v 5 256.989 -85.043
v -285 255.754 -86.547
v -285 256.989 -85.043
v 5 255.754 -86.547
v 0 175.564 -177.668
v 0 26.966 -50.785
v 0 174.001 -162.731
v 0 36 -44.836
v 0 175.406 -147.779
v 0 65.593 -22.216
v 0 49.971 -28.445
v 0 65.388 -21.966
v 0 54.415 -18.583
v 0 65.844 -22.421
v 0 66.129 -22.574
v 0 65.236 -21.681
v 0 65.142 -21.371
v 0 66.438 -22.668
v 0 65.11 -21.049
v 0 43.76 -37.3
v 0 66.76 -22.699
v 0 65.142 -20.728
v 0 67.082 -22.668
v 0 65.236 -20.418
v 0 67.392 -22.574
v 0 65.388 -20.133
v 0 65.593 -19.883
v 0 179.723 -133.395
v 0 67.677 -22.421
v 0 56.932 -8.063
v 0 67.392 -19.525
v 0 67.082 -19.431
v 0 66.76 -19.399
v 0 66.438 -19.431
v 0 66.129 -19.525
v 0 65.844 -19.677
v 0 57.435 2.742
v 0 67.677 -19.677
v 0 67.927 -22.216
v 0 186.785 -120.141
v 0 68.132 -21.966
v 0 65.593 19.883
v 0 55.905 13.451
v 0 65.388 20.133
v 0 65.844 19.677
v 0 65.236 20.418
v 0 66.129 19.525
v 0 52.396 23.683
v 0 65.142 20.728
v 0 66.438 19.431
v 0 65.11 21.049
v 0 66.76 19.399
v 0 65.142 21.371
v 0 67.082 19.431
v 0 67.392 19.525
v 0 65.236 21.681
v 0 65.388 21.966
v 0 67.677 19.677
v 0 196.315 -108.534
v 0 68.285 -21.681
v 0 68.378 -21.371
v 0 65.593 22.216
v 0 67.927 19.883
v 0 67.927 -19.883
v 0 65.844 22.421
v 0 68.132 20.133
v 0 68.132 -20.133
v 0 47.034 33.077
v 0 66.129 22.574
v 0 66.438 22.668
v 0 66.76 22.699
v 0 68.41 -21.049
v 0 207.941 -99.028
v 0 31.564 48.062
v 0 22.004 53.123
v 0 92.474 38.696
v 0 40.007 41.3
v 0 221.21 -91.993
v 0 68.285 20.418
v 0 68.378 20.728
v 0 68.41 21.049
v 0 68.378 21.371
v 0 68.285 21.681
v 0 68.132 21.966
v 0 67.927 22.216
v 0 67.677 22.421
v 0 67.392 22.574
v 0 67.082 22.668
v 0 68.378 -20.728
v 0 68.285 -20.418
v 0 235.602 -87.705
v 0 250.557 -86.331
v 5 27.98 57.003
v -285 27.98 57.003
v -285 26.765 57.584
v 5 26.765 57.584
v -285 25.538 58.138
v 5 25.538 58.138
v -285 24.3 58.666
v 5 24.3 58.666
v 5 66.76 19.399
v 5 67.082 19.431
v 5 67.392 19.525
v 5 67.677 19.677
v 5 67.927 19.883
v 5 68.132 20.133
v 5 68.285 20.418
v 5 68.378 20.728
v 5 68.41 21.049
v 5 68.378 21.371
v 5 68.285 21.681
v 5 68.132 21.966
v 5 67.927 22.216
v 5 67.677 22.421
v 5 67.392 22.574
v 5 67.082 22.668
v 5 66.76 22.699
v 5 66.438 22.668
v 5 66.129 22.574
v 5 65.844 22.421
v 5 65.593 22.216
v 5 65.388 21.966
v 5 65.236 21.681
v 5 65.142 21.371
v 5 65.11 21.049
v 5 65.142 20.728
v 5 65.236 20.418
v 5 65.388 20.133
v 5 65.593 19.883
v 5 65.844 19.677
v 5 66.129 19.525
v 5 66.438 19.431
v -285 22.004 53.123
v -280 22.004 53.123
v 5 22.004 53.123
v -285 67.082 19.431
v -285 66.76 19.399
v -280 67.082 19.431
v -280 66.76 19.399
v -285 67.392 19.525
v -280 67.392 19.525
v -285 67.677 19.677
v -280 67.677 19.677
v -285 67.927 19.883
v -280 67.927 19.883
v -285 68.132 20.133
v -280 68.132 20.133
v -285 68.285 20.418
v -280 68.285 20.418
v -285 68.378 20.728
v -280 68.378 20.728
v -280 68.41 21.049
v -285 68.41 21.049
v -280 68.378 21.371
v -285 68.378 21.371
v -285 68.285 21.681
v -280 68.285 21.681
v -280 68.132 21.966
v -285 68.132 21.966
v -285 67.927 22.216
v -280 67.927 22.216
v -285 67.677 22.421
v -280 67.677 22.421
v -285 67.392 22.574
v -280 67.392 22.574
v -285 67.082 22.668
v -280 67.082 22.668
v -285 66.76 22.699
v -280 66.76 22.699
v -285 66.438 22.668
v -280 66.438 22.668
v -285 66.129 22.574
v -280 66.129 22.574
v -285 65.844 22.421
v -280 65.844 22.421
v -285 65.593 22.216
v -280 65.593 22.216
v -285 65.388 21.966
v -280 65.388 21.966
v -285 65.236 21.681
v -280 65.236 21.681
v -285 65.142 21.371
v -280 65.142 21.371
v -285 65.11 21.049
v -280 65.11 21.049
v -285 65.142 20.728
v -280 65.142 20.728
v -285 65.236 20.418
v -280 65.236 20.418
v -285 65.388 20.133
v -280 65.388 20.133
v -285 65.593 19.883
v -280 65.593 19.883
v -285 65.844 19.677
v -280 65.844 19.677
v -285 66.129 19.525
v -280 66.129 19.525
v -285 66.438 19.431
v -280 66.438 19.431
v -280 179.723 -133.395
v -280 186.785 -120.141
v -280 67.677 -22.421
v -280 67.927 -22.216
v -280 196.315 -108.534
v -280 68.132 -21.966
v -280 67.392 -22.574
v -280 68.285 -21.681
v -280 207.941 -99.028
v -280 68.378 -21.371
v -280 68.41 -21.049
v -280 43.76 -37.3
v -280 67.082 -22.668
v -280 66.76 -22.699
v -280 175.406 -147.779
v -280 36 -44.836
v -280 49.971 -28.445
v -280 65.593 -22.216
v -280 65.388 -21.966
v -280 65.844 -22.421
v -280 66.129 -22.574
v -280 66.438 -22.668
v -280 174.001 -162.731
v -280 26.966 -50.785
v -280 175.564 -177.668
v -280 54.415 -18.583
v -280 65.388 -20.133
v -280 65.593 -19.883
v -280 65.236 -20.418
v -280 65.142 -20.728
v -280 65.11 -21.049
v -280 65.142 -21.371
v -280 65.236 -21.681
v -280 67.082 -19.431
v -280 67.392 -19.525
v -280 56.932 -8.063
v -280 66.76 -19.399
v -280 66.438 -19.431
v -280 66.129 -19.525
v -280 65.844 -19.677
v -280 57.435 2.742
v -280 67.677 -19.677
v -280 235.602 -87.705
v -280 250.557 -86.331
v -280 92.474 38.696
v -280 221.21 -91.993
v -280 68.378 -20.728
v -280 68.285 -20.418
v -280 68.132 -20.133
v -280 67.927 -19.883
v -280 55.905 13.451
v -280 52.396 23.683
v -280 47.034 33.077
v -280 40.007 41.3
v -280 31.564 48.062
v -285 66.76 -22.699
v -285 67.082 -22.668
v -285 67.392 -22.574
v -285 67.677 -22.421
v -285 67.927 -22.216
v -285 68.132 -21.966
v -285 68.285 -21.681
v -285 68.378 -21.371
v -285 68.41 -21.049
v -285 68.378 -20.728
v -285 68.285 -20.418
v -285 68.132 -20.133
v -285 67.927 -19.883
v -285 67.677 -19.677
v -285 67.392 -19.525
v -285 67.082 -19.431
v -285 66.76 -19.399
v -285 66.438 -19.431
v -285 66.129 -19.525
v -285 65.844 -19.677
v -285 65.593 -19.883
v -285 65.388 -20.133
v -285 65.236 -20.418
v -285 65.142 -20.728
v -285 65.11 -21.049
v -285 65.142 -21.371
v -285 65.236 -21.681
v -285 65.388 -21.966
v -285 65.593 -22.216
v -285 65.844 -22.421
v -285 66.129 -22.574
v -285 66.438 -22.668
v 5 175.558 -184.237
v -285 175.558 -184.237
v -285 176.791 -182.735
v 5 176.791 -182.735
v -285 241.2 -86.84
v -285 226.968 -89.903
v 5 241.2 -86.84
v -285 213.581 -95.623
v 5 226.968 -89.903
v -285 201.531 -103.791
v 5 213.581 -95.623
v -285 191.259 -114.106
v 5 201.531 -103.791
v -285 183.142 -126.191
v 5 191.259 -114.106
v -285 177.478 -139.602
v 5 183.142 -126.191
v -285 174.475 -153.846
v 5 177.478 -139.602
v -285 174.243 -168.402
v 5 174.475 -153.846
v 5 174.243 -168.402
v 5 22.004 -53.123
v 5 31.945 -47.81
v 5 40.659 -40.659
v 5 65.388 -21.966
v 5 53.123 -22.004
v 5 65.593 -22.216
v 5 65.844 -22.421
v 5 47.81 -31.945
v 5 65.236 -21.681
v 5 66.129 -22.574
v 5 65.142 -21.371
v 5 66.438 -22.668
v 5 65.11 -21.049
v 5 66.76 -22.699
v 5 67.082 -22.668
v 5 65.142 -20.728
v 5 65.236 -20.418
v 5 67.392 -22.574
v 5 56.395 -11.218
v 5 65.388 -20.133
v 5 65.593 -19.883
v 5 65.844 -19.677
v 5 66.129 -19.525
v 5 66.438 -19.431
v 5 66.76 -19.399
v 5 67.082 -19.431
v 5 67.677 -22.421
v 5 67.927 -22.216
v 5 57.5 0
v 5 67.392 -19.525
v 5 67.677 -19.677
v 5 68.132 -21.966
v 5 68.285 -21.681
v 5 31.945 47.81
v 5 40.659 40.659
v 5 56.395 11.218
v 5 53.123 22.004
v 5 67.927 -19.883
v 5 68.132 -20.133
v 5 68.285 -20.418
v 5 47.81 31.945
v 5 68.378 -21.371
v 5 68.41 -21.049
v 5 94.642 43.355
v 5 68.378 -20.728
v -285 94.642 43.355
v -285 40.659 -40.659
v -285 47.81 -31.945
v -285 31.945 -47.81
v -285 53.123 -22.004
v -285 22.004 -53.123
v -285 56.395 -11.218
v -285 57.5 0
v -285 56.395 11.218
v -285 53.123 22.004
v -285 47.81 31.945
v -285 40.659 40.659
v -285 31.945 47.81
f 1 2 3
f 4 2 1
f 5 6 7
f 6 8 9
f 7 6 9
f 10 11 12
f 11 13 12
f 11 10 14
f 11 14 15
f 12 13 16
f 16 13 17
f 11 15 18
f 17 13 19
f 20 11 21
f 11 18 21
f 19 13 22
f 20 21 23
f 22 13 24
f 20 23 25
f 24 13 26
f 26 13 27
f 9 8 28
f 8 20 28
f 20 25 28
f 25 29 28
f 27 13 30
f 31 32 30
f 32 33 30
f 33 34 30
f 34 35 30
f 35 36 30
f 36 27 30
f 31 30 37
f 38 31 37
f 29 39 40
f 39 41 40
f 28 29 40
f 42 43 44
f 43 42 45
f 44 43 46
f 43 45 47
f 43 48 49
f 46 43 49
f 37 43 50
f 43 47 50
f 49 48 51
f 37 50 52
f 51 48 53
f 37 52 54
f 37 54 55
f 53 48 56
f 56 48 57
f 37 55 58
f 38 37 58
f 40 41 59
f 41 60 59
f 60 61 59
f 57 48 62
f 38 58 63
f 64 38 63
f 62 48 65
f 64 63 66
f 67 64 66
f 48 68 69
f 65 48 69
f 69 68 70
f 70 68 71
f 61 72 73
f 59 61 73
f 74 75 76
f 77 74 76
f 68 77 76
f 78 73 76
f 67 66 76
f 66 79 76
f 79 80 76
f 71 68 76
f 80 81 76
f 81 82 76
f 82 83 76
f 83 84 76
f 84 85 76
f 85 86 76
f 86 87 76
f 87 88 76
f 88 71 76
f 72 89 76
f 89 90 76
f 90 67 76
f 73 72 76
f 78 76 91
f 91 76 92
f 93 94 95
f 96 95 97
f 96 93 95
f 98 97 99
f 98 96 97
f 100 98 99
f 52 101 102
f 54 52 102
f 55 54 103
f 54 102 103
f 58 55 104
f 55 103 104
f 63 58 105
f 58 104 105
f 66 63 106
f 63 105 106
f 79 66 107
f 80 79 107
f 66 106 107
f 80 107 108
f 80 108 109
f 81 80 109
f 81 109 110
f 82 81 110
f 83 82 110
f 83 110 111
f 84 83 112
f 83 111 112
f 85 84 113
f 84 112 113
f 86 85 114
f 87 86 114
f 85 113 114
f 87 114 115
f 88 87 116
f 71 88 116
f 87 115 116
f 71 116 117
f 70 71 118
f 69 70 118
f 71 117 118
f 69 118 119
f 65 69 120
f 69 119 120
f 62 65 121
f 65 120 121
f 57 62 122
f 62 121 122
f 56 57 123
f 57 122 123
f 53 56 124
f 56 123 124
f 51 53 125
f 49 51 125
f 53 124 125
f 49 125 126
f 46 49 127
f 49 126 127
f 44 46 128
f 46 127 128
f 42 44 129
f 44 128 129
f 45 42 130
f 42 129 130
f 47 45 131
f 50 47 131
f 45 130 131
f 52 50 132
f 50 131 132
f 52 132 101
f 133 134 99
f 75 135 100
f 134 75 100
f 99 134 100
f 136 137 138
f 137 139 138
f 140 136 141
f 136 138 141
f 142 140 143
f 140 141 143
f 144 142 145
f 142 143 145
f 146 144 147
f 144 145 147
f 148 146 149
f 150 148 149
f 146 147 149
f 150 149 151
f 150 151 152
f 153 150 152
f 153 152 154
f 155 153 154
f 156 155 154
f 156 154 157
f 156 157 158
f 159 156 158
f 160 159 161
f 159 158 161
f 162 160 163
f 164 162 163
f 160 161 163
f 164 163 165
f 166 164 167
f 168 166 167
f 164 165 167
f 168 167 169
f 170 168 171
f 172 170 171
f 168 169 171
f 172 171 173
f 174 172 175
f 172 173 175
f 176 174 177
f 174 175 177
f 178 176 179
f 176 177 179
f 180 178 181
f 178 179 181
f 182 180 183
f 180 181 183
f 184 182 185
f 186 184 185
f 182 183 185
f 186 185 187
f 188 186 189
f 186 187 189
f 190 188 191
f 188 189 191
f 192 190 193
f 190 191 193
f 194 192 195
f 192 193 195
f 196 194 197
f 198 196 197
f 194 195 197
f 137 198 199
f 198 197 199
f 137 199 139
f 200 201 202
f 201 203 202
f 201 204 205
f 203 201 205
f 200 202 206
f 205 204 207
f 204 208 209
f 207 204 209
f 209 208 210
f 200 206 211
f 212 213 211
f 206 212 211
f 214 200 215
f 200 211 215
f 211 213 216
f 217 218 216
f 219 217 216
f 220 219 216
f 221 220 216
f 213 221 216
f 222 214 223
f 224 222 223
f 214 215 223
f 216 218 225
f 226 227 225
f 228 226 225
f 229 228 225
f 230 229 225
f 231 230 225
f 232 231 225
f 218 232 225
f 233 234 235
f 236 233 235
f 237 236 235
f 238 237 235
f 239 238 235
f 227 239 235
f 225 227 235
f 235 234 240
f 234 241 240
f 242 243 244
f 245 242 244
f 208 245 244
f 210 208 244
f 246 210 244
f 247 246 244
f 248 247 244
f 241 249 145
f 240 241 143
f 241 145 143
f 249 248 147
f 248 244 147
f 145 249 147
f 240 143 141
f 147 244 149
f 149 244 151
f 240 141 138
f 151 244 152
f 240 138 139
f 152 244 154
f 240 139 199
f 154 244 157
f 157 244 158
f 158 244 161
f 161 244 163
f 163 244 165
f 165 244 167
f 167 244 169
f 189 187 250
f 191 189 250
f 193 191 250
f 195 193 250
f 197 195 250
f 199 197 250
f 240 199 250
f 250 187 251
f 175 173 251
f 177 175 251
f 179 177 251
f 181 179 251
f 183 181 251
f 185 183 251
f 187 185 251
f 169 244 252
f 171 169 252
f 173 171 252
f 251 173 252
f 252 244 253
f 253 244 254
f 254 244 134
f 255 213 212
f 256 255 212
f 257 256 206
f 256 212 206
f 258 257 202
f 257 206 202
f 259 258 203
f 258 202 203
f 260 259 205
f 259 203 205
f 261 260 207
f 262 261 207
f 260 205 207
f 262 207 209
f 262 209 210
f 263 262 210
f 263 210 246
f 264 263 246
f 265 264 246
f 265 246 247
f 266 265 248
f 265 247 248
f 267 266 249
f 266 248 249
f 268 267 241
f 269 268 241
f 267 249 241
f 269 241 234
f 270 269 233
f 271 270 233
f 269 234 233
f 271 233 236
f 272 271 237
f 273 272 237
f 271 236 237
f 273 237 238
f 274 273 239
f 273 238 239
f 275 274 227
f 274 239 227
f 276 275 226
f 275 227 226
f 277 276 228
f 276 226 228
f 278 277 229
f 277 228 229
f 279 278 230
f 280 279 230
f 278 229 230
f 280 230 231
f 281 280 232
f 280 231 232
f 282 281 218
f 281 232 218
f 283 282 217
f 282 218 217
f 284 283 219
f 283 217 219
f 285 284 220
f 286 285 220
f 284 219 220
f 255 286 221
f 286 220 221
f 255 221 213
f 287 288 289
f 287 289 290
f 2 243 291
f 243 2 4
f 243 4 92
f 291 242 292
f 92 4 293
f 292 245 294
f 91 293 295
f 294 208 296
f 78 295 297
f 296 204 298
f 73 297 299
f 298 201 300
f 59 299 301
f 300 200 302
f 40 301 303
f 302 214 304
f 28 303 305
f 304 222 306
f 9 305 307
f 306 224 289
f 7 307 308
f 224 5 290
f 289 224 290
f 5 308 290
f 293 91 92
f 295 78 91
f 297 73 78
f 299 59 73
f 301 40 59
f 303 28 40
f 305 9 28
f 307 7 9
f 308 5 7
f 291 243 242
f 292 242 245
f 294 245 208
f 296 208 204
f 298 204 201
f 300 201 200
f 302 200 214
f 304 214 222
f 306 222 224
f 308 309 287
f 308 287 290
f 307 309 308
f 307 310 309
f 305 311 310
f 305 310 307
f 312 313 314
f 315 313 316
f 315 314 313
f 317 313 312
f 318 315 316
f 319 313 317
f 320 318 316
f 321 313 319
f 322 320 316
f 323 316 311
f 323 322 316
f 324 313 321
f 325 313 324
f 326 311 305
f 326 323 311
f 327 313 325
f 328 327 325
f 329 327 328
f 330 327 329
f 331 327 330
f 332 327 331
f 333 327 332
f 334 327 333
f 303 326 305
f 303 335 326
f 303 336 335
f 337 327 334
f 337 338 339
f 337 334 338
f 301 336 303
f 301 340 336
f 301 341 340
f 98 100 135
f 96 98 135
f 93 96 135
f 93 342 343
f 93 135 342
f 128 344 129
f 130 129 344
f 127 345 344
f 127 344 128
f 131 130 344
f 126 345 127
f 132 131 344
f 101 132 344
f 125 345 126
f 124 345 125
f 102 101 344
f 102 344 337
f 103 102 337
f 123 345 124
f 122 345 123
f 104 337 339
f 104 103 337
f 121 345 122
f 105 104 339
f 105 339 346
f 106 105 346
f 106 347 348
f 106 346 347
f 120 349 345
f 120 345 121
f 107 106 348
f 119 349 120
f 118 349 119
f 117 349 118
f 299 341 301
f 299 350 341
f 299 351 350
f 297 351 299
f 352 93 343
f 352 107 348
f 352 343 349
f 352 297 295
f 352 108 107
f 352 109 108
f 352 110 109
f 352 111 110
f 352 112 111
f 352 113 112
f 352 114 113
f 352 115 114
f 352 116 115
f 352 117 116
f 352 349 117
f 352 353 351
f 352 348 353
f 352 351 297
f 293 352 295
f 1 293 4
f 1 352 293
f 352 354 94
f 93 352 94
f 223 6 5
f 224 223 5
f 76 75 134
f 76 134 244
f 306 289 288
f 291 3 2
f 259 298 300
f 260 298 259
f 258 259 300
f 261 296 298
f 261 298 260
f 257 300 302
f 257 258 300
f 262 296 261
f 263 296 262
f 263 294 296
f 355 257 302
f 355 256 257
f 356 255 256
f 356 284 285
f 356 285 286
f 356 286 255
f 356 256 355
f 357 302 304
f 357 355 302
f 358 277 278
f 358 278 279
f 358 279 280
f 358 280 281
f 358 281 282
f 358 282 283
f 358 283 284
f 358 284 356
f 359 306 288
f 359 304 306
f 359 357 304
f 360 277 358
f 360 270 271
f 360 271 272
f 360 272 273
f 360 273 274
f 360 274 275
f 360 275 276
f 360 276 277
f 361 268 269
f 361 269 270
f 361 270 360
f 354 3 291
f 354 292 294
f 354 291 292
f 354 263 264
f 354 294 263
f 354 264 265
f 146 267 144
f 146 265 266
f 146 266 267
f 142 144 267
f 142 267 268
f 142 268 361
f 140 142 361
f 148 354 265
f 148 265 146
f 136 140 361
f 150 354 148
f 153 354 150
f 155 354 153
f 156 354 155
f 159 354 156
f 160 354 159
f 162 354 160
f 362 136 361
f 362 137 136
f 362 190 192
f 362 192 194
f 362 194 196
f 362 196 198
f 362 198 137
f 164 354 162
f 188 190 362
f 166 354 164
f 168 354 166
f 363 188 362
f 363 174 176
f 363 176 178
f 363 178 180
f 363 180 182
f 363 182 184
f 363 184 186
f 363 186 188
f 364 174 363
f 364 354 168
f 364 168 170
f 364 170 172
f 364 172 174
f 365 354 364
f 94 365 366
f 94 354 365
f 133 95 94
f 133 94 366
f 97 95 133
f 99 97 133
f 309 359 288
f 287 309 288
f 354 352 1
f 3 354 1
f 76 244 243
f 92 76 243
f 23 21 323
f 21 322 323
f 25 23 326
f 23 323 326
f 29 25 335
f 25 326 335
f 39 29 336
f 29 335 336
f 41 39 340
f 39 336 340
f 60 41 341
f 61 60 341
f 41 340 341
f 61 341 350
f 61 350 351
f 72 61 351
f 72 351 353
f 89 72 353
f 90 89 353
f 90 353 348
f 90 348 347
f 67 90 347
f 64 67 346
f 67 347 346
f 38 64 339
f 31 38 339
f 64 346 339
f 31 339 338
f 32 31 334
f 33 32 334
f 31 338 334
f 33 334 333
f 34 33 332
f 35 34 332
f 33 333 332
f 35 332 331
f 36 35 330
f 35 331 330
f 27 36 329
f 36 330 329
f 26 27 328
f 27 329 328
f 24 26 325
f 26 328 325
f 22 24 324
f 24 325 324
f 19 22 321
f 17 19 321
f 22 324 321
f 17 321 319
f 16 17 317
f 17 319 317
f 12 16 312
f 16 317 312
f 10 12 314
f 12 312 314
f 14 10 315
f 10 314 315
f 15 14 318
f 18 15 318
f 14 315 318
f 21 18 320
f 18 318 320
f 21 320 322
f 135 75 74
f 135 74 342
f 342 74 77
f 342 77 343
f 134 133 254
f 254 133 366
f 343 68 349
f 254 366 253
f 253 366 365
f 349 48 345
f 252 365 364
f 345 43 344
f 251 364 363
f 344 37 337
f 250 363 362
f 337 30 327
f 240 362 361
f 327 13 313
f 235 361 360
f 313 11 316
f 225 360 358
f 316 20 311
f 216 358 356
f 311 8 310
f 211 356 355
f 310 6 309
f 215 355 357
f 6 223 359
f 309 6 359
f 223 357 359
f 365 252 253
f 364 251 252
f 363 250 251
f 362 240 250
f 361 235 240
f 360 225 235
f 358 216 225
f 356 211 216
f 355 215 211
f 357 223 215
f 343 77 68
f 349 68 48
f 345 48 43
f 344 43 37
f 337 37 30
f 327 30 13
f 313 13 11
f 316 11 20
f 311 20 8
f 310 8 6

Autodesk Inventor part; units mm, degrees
ref_plane "YZ Plane" through (0, 0, 0) normal (1, 0, 0) x (0, 1, 0)
ref_plane "XZ Plane" through (0, 0, 0) normal (0, 1, 0) x (-1, 0, 0)
ref_plane "XY Plane" through (0, 0, 0) normal (0, 0, 1) x (1, 0, 0)
sketch "Sketch1" plane through (0, 0, 0) normal (1, 0, 0) x (0, 1, 0)
  circle A0 centre (0, 0) radius 57.5
  line L0 (0, 0) -> (22.0043, 53.1231)
  line L1 (0, 0) -> (22.0043, -53.1231)
  line L2 (22.0043, 53.1231) -> (22.0043, -53.1231) construction
  line L3 (22.0043, 53.1231) -> (24.3004, 58.6664)
  line L4 (22.0043, -53.1231) -> (24.3004, -58.6664)
  circle A1 centre (0, 0) radius 63.5
  line L5 (22.0043, -53.1231) -> (207.792, -211.7609)
  line L6 (0, 0) -> (0, -50)
  line L7 (94.6424, 43.3552) -> (292.208, -112.8976)
  line L8 (92.474, 38.6955) -> (288.9589, -116.7027)
  line L9 (26.9658, -50.7848) -> (211.0388, -207.9584)
  line L10 (292.208, -112.8976) -> (207.792, -211.7609)
  circle A2 centre (250, -162.3292) radius 10
  circle A3 centre (250, -162.3292) radius 76
  line L11 (94.6424, 43.3552) -> (27.9796, 57.0034)
  line L12 (22.0043, 53.1231) -> (92.474, 38.6955)
  line L13 (0, 0) -> (0, -77.5)
  point P0 (22.0043, 0)
  point P1 (250.5574, -86.3313)
  point P2 (259.3441, -86.9058)
  point P3 (177.842, -186.1875)
  point P4 (175.5639, -177.6676)
  point P5 (243.5065, -169.9341)
  point P6 (256.4935, -154.7244)
  point P7 (27.0643, -57.4436)
  point P8 (39.7995, 49.4798)
  point P9 (31.8357, -54.943)
  dimension "d0" = 115
  dimension "d1" = 135
  dimension "d2" = 6
  dimension "d6" = 5
  dimension "d7" = 5
  dimension "d8" = 90
  dimension "d9" = 130
  dimension "d11" = 50
  dimension "d14" = 20
  dimension "d16" = 152
  dimension "d17" = 250
  dimension "d18" = 5
  dimension "d24" = 77.5
  dimension "d26" = 264
extrude "Extrusion1" add sketch "Sketch1" against normal blind 280 contours L3 A1 L12 | L9 A1 L5 A0 | A1 L11 L7 A3 L8 L12 | L9 A3 L5 A1
extrude "Extrusion2" add sketch "Sketch1" along normal blind 5 contours A0 L12 A1 L9 | L3 A1 L12 | L9 A1 L5 A0 | L12 L8 A3 L9 A1 | A1 L11 L7 A3 L8 L12 | L9 A3 L5 A1
ref_plane "Work Plane1" through (-140, 0, 0) normal (-1, 0, 0) x (0, 0, 1)
mirror "Mirror1" about plane through (-140, 0, 0) normal (-1, 0, 0) of "Extrusion2"
sketch "Sketch2" plane through (5, 0, 0) normal (1, 0, 0) x (0, 0, -1)
  line L0 (86.9058, 259.3441) -> (-43.3552, 94.6424) projected
  line L1 (-43.3552, 94.6424) -> (-57.0034, 27.9796) projected
  arc A0 (-57.0034, 27.9796) -> (-58.6664, 24.3004) centre (0, 0) ccw projected
  line L2 (-58.6664, 24.3004) -> (-53.1231, 22.0043) projected
  arc A1 (53.1231, 22.0043) -> (-53.1231, 22.0043) centre (0, 0) ccw projected
  line L3 (53.1231, 22.0043) -> (186.1875, 177.842) projected
  arc A2 (86.9058, 259.3441) -> (186.1875, 177.842) centre (162.3292, 250) ccw projected
  circle A3 centre (0, 0) radius 63.5 projected
  circle A4 centre (-21.0494, 66.7602) radius 1.65
  line L4 (-21.0494, 66.7602) -> (0, 0) construction
  line L5 (0, 0) -> (21.0494, 66.7602) construction
  line L6 (-21.0494, 66.7602) -> (21.0494, 66.7602) construction
  circle A5 centre (21.0494, 66.7602) radius 1.65
  point P0 (0, 66.7602)
  dimension "d19" = 3.3
  dimension "d20" = 70
  dimension "d21" = 35
extrude "Extrusion3" cut sketch "Sketch2" against normal through all contours A4 | A5
ref_plane "Work Plane2" through (0, 259.3441, -86.9058) normal (0, 0.7729, -0.6345) x (1, 0, 0)
sketch "Sketch3" plane through (0, 259.3441, -86.9058) normal (0, 0.7729, -0.6345) x (1, 0, 0)
  line L0 (-314.1788, 142.1673) -> (47.7858, 142.1673)
  line L1 (47.7858, 142.1673) -> (47.7858, -28.3874)
  line L2 (47.7858, -28.3874) -> (-314.1788, -28.3874)
  line L3 (-314.1788, -28.3874) -> (-314.1788, 142.1673)
  point P0 (0, 97.3835)
extrude "Extrusion4" cut sketch "Sketch3" against normal blind 3
properties part number "CANALETA_GUIA" material "Steel, Mild, Welded"
